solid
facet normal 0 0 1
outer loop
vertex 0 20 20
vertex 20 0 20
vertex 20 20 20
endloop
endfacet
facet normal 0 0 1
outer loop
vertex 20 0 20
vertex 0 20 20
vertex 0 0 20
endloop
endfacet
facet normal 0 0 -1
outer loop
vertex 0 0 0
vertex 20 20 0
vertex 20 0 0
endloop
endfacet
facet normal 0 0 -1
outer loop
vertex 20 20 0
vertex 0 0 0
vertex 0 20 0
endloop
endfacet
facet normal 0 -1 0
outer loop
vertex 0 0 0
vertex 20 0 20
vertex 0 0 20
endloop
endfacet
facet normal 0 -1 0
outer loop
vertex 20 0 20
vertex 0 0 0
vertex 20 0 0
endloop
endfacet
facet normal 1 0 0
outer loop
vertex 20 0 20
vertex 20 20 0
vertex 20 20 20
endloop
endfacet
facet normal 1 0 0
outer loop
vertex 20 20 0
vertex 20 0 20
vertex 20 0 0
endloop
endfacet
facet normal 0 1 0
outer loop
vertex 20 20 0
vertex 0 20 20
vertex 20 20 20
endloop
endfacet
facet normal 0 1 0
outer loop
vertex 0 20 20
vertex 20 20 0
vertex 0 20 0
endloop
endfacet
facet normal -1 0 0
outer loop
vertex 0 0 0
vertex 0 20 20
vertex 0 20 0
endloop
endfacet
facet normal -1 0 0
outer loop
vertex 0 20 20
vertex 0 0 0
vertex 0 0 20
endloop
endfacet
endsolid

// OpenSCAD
// Ultra-simple test
color([0, 1, 0]) // Bright green
cube([20, 20, 20]);
